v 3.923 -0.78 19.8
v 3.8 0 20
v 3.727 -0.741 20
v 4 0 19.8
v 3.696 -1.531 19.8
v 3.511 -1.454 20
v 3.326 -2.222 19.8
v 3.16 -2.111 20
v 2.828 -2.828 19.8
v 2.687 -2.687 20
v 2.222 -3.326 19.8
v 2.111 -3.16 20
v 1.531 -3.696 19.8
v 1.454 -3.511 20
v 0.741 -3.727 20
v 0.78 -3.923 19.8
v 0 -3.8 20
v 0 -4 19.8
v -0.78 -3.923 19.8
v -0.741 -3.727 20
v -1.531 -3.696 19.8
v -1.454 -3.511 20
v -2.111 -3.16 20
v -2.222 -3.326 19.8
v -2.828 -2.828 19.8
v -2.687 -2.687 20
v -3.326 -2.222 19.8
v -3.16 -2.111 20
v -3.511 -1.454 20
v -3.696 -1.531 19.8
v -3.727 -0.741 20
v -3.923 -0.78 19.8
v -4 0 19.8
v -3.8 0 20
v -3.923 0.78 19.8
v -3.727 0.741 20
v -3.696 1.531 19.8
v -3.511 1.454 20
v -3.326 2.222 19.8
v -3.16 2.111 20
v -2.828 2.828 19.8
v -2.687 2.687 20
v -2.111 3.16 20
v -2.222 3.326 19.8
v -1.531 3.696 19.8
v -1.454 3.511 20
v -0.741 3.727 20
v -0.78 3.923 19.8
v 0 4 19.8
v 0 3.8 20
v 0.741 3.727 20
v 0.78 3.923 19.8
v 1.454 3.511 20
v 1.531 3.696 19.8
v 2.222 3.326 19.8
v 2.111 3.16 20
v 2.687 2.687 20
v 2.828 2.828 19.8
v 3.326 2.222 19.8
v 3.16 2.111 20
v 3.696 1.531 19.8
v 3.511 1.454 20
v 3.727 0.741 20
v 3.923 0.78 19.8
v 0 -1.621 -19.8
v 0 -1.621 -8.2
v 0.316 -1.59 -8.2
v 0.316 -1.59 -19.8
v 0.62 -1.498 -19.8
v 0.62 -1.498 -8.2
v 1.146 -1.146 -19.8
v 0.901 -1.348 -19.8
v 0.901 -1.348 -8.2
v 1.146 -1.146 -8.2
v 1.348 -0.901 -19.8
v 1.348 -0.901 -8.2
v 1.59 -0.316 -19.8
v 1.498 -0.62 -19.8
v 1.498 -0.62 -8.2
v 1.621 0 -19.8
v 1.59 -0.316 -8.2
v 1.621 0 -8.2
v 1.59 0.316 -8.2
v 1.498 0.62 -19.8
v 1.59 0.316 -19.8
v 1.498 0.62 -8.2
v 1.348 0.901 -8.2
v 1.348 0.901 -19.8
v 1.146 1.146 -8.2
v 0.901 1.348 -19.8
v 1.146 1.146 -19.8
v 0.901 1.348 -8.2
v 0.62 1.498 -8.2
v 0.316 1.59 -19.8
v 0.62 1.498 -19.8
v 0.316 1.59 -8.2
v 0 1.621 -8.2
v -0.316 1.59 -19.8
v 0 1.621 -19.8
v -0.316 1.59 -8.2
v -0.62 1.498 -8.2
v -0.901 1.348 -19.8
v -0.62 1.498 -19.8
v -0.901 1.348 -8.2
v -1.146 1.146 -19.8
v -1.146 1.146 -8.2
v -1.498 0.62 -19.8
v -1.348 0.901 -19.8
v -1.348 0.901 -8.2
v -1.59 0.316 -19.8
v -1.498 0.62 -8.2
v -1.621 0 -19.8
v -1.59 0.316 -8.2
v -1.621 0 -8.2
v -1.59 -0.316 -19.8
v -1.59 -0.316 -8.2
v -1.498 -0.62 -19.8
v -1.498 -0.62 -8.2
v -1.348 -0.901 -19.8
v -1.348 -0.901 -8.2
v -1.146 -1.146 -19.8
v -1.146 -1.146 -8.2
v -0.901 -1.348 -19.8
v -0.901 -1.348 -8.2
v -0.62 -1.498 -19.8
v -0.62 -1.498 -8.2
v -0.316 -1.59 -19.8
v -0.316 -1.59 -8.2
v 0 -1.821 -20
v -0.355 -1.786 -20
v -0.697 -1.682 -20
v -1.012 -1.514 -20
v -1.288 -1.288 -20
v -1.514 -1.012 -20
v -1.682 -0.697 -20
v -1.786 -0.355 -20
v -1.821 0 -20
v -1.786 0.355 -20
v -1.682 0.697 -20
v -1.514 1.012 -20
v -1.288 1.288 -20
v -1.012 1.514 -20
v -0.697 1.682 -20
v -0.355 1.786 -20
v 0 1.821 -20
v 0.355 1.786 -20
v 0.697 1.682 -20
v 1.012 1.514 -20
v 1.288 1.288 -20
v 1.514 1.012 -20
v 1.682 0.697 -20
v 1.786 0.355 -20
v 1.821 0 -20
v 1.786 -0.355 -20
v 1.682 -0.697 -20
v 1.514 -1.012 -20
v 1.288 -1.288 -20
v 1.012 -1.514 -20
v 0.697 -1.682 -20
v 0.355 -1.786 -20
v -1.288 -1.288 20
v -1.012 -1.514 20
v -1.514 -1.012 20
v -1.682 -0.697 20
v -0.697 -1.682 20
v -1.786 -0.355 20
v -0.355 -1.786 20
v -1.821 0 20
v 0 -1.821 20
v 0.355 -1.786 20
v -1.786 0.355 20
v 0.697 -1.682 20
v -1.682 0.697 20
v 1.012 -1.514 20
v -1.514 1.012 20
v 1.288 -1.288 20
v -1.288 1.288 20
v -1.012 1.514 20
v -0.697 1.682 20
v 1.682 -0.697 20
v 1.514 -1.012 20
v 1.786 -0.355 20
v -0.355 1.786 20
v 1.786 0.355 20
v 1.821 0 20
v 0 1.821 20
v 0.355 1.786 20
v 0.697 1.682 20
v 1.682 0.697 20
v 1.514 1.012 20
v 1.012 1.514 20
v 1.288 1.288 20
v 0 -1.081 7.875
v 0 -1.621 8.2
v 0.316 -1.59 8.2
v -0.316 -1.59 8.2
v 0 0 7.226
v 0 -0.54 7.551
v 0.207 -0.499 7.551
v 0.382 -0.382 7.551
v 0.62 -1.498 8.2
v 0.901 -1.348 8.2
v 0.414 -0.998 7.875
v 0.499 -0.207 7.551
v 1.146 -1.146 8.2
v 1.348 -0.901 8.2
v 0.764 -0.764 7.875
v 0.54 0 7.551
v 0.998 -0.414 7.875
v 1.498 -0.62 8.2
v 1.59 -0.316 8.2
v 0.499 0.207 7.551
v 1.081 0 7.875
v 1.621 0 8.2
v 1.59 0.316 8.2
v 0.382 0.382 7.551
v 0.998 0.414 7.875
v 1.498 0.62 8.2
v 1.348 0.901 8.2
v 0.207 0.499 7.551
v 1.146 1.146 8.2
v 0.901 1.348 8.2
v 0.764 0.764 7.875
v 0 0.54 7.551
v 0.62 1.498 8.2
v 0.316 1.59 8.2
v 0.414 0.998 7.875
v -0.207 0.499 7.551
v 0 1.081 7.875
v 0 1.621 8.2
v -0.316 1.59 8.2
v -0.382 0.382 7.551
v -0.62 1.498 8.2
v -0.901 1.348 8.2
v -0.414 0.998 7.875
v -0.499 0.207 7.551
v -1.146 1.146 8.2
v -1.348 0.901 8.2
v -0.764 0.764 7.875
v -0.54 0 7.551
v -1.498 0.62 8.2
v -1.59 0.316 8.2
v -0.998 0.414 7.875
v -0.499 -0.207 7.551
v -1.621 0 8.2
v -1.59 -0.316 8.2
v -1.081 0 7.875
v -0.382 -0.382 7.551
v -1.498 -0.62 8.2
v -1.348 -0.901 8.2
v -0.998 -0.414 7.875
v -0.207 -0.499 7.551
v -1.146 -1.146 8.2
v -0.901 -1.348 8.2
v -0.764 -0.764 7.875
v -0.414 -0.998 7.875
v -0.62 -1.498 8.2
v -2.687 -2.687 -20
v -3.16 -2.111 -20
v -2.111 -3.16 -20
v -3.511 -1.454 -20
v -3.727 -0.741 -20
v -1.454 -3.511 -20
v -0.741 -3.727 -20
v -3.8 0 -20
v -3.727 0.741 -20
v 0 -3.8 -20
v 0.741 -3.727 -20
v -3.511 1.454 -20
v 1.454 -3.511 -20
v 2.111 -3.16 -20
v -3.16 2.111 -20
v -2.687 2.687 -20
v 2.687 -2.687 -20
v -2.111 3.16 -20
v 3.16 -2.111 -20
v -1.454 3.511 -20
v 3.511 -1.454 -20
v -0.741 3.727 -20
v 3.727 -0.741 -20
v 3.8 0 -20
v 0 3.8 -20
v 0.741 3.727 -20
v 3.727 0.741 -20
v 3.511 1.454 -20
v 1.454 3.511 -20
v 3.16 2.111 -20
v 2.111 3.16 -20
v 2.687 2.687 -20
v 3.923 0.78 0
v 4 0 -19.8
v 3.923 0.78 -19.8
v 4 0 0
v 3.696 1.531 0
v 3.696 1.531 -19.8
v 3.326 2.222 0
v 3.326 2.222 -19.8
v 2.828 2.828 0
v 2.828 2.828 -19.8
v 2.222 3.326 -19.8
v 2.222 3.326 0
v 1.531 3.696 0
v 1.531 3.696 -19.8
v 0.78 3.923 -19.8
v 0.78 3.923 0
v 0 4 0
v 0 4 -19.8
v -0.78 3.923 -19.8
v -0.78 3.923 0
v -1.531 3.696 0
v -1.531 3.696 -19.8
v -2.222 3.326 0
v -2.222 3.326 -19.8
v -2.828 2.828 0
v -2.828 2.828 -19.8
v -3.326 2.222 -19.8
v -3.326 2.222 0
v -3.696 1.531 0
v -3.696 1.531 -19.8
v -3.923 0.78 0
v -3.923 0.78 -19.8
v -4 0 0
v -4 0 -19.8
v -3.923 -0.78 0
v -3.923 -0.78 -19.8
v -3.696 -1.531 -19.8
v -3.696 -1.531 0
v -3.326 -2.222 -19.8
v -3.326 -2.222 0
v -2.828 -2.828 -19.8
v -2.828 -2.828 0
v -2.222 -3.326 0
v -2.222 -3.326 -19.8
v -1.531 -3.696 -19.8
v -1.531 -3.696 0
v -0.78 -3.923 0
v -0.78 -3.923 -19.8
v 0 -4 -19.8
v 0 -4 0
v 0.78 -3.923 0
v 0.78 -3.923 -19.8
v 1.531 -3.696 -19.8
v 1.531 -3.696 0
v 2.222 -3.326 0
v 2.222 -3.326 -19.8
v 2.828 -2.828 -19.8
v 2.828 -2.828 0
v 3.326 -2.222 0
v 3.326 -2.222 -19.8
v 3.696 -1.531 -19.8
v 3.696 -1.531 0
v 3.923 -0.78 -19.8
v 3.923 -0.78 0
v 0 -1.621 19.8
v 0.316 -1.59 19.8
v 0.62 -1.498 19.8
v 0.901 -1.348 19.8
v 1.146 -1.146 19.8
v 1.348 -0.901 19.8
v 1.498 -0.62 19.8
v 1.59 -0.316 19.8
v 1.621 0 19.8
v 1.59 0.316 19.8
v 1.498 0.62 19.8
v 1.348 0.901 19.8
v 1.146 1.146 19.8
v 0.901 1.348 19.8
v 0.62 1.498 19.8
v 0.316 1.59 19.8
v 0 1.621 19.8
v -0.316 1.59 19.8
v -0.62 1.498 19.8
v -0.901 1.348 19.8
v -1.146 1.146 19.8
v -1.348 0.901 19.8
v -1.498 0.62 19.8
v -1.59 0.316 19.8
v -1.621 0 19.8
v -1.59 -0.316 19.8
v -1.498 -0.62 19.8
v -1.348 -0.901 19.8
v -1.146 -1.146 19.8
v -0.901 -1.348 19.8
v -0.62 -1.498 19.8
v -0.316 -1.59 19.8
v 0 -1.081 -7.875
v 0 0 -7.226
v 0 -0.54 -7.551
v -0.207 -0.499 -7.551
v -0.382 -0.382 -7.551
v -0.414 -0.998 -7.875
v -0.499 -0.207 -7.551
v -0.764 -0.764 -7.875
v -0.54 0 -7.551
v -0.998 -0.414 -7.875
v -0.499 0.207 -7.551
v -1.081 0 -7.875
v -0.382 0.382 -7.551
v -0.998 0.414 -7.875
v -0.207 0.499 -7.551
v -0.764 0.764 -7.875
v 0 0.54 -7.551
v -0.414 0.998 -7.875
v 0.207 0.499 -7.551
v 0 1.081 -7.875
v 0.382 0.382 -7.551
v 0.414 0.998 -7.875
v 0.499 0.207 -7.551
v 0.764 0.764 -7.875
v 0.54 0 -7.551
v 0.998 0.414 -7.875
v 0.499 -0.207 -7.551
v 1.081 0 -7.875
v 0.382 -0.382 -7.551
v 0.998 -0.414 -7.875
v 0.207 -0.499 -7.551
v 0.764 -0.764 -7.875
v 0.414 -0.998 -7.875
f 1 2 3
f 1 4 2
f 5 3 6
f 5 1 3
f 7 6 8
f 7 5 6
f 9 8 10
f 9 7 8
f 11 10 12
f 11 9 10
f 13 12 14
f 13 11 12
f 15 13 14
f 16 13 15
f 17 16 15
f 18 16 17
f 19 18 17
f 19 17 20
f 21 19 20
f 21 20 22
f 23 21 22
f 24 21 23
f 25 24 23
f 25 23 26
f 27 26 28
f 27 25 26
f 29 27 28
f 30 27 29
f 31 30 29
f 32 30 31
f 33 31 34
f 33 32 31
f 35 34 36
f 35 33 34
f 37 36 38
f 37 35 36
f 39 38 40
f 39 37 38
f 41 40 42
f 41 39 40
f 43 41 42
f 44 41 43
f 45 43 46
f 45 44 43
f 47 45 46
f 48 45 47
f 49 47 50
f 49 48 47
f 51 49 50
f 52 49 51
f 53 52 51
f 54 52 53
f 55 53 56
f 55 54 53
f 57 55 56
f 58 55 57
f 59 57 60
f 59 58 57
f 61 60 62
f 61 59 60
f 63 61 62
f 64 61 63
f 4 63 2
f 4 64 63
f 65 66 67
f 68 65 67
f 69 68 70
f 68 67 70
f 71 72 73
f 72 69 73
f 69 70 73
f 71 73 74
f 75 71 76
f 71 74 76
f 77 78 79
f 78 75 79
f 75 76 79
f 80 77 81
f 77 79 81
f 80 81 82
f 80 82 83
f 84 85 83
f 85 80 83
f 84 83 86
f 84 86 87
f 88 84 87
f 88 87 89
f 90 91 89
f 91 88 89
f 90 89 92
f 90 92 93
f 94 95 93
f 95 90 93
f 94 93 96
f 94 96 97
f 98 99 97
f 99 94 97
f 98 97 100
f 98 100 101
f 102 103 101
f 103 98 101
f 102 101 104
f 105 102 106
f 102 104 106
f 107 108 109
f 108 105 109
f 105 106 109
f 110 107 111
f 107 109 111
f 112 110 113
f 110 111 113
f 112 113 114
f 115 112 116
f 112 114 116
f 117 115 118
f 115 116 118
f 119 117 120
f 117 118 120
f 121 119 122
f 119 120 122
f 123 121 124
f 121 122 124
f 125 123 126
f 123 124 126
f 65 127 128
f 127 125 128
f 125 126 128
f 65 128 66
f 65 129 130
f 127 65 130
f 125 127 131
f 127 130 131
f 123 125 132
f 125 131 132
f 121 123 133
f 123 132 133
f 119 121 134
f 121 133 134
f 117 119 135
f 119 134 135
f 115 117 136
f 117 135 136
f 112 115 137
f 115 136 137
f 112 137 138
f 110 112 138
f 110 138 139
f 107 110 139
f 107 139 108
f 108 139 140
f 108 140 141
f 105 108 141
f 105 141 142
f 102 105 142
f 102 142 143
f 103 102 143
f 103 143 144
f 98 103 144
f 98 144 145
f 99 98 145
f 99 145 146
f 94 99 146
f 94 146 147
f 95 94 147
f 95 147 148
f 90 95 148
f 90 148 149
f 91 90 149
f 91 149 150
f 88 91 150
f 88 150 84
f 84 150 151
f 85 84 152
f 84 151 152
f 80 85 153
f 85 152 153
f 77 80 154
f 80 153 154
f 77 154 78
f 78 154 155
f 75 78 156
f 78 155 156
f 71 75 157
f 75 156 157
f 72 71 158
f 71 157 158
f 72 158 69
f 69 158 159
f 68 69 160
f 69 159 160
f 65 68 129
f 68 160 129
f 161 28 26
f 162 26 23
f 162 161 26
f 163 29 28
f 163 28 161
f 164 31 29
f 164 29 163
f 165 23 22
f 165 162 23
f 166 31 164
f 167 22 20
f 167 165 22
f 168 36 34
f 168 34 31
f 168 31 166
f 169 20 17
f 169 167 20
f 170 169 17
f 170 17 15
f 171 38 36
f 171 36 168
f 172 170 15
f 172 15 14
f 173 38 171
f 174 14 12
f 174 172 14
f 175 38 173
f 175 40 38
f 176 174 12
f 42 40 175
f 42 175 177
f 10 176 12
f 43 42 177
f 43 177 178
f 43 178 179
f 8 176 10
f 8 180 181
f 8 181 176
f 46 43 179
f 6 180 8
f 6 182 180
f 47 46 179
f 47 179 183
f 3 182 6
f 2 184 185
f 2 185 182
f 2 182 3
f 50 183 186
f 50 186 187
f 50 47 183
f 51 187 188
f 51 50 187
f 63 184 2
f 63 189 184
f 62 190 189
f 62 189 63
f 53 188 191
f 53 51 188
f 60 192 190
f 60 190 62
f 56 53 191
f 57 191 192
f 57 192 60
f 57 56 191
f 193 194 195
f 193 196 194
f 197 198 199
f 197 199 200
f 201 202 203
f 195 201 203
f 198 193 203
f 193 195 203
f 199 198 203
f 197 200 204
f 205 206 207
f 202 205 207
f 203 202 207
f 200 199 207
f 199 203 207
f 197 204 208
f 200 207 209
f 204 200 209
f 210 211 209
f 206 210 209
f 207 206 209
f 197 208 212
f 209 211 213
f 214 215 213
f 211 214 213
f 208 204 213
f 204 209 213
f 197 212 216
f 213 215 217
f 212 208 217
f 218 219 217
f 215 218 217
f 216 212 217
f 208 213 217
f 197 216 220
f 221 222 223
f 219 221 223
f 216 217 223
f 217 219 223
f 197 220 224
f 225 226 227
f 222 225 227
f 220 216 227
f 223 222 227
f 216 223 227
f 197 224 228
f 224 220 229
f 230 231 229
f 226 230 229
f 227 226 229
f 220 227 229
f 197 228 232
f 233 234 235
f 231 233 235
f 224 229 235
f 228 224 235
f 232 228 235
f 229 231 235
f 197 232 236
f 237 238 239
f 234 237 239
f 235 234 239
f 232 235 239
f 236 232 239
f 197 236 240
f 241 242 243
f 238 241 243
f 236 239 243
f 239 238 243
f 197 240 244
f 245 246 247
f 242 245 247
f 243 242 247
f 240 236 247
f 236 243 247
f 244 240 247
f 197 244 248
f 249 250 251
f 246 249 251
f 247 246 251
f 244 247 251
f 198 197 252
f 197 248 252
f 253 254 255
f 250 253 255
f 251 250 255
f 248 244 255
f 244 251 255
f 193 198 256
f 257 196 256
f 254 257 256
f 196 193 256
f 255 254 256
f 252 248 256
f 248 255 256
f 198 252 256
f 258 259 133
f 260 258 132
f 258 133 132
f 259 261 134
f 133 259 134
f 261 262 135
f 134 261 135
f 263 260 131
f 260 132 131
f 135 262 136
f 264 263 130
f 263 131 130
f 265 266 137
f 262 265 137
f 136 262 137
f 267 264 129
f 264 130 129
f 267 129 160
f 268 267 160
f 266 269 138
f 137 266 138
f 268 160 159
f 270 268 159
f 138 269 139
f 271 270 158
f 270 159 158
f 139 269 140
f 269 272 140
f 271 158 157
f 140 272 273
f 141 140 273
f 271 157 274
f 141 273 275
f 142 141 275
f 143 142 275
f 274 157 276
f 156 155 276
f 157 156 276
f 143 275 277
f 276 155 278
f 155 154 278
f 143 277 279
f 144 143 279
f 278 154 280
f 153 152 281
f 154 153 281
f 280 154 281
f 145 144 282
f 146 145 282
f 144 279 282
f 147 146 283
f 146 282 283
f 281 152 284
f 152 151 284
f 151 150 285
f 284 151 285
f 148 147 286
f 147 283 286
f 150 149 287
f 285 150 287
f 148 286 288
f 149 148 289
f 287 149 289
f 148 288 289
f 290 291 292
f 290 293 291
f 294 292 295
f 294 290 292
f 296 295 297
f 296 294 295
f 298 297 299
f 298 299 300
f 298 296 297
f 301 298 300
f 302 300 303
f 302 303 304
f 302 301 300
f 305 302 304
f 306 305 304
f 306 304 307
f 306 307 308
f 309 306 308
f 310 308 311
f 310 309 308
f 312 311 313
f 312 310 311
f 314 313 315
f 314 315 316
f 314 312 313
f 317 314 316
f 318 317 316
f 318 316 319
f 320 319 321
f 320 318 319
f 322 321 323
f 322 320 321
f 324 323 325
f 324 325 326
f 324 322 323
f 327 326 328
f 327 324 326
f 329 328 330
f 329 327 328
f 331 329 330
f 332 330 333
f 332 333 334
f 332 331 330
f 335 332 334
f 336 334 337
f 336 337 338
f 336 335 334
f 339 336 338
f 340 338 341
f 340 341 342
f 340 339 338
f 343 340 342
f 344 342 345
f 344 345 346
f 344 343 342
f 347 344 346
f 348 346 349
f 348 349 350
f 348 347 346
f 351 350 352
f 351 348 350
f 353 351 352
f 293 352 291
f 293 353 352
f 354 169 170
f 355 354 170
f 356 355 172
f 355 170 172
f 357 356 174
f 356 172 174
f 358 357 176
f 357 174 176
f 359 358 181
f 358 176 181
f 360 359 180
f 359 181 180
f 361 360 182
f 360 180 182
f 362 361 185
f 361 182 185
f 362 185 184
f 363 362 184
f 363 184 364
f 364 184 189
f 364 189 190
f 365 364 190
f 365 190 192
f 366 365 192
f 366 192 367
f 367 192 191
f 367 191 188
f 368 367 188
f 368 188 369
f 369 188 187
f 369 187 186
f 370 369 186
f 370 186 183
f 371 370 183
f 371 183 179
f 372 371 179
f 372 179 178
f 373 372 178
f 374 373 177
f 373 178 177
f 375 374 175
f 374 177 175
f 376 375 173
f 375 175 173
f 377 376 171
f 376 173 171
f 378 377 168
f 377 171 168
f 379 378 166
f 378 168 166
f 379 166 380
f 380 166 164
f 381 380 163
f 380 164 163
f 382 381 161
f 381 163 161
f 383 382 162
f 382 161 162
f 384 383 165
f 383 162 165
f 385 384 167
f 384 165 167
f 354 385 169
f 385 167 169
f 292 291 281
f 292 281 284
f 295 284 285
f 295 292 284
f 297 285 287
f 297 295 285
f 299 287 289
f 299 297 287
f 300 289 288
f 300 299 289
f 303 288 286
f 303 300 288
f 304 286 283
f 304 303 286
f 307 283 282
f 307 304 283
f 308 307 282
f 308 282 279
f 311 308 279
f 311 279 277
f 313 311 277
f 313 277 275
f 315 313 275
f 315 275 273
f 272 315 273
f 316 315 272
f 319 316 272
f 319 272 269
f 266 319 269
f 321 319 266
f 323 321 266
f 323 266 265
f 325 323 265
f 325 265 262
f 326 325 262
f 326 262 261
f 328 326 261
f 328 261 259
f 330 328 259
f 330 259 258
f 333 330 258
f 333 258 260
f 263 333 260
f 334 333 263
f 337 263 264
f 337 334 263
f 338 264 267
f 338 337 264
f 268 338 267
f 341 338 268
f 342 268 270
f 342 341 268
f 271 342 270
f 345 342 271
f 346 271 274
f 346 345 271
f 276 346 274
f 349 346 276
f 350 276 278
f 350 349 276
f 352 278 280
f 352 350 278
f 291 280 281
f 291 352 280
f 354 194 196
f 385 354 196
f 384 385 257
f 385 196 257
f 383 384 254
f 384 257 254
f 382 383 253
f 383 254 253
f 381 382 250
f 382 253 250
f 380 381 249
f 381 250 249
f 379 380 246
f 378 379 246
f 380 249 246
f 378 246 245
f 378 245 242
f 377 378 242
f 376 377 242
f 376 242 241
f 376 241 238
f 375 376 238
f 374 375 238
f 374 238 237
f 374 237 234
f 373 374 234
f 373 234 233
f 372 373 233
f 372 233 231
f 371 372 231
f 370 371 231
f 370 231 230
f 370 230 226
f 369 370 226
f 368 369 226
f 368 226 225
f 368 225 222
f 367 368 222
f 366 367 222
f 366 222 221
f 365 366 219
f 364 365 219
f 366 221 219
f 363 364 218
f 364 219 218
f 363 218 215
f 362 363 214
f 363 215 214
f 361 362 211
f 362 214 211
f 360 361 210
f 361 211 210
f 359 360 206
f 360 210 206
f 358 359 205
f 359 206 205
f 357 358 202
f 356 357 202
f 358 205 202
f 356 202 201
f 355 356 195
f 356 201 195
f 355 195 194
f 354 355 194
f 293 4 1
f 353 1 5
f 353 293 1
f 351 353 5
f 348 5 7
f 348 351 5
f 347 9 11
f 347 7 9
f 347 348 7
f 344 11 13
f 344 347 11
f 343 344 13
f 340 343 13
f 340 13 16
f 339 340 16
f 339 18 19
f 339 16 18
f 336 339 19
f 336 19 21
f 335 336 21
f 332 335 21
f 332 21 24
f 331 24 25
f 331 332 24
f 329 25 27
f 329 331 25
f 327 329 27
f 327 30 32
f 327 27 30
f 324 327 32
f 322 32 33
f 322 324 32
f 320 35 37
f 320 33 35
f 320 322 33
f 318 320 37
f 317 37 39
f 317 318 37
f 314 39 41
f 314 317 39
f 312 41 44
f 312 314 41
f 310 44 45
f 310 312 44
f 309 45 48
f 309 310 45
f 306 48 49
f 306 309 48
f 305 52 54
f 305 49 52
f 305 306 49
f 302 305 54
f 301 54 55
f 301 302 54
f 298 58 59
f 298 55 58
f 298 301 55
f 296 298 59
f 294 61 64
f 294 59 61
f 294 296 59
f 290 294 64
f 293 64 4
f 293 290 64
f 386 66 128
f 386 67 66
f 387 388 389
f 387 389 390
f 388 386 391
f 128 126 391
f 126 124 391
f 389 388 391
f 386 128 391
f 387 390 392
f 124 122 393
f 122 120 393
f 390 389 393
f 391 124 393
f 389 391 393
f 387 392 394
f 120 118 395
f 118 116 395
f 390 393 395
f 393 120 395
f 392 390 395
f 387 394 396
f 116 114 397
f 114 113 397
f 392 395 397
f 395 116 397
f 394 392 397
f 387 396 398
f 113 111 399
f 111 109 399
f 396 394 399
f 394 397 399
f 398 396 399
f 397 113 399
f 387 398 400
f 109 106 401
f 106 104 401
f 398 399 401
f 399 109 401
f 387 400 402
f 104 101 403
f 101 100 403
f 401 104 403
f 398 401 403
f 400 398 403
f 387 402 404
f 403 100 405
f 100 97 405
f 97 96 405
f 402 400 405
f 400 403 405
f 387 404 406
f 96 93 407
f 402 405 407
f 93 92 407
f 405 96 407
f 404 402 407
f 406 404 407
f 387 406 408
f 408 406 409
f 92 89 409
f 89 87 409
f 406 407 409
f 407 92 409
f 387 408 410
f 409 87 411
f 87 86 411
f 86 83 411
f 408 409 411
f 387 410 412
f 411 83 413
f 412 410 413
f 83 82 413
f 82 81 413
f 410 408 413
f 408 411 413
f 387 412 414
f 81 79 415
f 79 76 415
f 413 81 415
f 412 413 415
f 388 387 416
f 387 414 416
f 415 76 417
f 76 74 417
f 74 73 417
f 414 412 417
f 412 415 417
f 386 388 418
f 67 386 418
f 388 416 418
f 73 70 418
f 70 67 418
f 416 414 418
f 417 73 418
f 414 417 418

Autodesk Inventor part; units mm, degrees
ref_plane "YZ Plane" through (0, 0, 0) normal (1, 0, 0) x (0, 1, 0)
ref_plane "XZ Plane" through (0, 0, 0) normal (0, 1, 0) x (-1, 0, 0)
ref_plane "XY Plane" through (0, 0, 0) normal (0, 0, 1) x (1, 0, 0)
sketch "スケッチ1" plane through (0, 0, 0) normal (0, 0, 1) x (1, 0, 0)
  circle A0 centre (0, 0) radius 4
  dimension "d13" = 8
extrude "押し出し1" add sketch "スケッチ1" along normal mid plane 40
sketch "スケッチ2" plane through (0, 0, 20) normal (0, 0, 1) x (1, 0, 0)
  point P0 (0, 0)
  point P1 (0, 0)
hole "穴1" at (0, 0, 20) direction (0, 0, -1) diameter 3.242 depth 11.8 tip angle 118 thread size "M4x0.7" class "6H" standard "ANSI Metric M Profile"
mirror "ミラー1" about plane through (0, 0, 0) normal (0, 0, 1) of "穴1"
chamfer "面取り1" distance 0.2 angle 45 4 edges at (0, 1.621, 20) (-4, 0, 20) (-4, 0, -20) (0, 1.621, -20)
properties part number "unir-spacer5" material "鋼、炭素鋼"
